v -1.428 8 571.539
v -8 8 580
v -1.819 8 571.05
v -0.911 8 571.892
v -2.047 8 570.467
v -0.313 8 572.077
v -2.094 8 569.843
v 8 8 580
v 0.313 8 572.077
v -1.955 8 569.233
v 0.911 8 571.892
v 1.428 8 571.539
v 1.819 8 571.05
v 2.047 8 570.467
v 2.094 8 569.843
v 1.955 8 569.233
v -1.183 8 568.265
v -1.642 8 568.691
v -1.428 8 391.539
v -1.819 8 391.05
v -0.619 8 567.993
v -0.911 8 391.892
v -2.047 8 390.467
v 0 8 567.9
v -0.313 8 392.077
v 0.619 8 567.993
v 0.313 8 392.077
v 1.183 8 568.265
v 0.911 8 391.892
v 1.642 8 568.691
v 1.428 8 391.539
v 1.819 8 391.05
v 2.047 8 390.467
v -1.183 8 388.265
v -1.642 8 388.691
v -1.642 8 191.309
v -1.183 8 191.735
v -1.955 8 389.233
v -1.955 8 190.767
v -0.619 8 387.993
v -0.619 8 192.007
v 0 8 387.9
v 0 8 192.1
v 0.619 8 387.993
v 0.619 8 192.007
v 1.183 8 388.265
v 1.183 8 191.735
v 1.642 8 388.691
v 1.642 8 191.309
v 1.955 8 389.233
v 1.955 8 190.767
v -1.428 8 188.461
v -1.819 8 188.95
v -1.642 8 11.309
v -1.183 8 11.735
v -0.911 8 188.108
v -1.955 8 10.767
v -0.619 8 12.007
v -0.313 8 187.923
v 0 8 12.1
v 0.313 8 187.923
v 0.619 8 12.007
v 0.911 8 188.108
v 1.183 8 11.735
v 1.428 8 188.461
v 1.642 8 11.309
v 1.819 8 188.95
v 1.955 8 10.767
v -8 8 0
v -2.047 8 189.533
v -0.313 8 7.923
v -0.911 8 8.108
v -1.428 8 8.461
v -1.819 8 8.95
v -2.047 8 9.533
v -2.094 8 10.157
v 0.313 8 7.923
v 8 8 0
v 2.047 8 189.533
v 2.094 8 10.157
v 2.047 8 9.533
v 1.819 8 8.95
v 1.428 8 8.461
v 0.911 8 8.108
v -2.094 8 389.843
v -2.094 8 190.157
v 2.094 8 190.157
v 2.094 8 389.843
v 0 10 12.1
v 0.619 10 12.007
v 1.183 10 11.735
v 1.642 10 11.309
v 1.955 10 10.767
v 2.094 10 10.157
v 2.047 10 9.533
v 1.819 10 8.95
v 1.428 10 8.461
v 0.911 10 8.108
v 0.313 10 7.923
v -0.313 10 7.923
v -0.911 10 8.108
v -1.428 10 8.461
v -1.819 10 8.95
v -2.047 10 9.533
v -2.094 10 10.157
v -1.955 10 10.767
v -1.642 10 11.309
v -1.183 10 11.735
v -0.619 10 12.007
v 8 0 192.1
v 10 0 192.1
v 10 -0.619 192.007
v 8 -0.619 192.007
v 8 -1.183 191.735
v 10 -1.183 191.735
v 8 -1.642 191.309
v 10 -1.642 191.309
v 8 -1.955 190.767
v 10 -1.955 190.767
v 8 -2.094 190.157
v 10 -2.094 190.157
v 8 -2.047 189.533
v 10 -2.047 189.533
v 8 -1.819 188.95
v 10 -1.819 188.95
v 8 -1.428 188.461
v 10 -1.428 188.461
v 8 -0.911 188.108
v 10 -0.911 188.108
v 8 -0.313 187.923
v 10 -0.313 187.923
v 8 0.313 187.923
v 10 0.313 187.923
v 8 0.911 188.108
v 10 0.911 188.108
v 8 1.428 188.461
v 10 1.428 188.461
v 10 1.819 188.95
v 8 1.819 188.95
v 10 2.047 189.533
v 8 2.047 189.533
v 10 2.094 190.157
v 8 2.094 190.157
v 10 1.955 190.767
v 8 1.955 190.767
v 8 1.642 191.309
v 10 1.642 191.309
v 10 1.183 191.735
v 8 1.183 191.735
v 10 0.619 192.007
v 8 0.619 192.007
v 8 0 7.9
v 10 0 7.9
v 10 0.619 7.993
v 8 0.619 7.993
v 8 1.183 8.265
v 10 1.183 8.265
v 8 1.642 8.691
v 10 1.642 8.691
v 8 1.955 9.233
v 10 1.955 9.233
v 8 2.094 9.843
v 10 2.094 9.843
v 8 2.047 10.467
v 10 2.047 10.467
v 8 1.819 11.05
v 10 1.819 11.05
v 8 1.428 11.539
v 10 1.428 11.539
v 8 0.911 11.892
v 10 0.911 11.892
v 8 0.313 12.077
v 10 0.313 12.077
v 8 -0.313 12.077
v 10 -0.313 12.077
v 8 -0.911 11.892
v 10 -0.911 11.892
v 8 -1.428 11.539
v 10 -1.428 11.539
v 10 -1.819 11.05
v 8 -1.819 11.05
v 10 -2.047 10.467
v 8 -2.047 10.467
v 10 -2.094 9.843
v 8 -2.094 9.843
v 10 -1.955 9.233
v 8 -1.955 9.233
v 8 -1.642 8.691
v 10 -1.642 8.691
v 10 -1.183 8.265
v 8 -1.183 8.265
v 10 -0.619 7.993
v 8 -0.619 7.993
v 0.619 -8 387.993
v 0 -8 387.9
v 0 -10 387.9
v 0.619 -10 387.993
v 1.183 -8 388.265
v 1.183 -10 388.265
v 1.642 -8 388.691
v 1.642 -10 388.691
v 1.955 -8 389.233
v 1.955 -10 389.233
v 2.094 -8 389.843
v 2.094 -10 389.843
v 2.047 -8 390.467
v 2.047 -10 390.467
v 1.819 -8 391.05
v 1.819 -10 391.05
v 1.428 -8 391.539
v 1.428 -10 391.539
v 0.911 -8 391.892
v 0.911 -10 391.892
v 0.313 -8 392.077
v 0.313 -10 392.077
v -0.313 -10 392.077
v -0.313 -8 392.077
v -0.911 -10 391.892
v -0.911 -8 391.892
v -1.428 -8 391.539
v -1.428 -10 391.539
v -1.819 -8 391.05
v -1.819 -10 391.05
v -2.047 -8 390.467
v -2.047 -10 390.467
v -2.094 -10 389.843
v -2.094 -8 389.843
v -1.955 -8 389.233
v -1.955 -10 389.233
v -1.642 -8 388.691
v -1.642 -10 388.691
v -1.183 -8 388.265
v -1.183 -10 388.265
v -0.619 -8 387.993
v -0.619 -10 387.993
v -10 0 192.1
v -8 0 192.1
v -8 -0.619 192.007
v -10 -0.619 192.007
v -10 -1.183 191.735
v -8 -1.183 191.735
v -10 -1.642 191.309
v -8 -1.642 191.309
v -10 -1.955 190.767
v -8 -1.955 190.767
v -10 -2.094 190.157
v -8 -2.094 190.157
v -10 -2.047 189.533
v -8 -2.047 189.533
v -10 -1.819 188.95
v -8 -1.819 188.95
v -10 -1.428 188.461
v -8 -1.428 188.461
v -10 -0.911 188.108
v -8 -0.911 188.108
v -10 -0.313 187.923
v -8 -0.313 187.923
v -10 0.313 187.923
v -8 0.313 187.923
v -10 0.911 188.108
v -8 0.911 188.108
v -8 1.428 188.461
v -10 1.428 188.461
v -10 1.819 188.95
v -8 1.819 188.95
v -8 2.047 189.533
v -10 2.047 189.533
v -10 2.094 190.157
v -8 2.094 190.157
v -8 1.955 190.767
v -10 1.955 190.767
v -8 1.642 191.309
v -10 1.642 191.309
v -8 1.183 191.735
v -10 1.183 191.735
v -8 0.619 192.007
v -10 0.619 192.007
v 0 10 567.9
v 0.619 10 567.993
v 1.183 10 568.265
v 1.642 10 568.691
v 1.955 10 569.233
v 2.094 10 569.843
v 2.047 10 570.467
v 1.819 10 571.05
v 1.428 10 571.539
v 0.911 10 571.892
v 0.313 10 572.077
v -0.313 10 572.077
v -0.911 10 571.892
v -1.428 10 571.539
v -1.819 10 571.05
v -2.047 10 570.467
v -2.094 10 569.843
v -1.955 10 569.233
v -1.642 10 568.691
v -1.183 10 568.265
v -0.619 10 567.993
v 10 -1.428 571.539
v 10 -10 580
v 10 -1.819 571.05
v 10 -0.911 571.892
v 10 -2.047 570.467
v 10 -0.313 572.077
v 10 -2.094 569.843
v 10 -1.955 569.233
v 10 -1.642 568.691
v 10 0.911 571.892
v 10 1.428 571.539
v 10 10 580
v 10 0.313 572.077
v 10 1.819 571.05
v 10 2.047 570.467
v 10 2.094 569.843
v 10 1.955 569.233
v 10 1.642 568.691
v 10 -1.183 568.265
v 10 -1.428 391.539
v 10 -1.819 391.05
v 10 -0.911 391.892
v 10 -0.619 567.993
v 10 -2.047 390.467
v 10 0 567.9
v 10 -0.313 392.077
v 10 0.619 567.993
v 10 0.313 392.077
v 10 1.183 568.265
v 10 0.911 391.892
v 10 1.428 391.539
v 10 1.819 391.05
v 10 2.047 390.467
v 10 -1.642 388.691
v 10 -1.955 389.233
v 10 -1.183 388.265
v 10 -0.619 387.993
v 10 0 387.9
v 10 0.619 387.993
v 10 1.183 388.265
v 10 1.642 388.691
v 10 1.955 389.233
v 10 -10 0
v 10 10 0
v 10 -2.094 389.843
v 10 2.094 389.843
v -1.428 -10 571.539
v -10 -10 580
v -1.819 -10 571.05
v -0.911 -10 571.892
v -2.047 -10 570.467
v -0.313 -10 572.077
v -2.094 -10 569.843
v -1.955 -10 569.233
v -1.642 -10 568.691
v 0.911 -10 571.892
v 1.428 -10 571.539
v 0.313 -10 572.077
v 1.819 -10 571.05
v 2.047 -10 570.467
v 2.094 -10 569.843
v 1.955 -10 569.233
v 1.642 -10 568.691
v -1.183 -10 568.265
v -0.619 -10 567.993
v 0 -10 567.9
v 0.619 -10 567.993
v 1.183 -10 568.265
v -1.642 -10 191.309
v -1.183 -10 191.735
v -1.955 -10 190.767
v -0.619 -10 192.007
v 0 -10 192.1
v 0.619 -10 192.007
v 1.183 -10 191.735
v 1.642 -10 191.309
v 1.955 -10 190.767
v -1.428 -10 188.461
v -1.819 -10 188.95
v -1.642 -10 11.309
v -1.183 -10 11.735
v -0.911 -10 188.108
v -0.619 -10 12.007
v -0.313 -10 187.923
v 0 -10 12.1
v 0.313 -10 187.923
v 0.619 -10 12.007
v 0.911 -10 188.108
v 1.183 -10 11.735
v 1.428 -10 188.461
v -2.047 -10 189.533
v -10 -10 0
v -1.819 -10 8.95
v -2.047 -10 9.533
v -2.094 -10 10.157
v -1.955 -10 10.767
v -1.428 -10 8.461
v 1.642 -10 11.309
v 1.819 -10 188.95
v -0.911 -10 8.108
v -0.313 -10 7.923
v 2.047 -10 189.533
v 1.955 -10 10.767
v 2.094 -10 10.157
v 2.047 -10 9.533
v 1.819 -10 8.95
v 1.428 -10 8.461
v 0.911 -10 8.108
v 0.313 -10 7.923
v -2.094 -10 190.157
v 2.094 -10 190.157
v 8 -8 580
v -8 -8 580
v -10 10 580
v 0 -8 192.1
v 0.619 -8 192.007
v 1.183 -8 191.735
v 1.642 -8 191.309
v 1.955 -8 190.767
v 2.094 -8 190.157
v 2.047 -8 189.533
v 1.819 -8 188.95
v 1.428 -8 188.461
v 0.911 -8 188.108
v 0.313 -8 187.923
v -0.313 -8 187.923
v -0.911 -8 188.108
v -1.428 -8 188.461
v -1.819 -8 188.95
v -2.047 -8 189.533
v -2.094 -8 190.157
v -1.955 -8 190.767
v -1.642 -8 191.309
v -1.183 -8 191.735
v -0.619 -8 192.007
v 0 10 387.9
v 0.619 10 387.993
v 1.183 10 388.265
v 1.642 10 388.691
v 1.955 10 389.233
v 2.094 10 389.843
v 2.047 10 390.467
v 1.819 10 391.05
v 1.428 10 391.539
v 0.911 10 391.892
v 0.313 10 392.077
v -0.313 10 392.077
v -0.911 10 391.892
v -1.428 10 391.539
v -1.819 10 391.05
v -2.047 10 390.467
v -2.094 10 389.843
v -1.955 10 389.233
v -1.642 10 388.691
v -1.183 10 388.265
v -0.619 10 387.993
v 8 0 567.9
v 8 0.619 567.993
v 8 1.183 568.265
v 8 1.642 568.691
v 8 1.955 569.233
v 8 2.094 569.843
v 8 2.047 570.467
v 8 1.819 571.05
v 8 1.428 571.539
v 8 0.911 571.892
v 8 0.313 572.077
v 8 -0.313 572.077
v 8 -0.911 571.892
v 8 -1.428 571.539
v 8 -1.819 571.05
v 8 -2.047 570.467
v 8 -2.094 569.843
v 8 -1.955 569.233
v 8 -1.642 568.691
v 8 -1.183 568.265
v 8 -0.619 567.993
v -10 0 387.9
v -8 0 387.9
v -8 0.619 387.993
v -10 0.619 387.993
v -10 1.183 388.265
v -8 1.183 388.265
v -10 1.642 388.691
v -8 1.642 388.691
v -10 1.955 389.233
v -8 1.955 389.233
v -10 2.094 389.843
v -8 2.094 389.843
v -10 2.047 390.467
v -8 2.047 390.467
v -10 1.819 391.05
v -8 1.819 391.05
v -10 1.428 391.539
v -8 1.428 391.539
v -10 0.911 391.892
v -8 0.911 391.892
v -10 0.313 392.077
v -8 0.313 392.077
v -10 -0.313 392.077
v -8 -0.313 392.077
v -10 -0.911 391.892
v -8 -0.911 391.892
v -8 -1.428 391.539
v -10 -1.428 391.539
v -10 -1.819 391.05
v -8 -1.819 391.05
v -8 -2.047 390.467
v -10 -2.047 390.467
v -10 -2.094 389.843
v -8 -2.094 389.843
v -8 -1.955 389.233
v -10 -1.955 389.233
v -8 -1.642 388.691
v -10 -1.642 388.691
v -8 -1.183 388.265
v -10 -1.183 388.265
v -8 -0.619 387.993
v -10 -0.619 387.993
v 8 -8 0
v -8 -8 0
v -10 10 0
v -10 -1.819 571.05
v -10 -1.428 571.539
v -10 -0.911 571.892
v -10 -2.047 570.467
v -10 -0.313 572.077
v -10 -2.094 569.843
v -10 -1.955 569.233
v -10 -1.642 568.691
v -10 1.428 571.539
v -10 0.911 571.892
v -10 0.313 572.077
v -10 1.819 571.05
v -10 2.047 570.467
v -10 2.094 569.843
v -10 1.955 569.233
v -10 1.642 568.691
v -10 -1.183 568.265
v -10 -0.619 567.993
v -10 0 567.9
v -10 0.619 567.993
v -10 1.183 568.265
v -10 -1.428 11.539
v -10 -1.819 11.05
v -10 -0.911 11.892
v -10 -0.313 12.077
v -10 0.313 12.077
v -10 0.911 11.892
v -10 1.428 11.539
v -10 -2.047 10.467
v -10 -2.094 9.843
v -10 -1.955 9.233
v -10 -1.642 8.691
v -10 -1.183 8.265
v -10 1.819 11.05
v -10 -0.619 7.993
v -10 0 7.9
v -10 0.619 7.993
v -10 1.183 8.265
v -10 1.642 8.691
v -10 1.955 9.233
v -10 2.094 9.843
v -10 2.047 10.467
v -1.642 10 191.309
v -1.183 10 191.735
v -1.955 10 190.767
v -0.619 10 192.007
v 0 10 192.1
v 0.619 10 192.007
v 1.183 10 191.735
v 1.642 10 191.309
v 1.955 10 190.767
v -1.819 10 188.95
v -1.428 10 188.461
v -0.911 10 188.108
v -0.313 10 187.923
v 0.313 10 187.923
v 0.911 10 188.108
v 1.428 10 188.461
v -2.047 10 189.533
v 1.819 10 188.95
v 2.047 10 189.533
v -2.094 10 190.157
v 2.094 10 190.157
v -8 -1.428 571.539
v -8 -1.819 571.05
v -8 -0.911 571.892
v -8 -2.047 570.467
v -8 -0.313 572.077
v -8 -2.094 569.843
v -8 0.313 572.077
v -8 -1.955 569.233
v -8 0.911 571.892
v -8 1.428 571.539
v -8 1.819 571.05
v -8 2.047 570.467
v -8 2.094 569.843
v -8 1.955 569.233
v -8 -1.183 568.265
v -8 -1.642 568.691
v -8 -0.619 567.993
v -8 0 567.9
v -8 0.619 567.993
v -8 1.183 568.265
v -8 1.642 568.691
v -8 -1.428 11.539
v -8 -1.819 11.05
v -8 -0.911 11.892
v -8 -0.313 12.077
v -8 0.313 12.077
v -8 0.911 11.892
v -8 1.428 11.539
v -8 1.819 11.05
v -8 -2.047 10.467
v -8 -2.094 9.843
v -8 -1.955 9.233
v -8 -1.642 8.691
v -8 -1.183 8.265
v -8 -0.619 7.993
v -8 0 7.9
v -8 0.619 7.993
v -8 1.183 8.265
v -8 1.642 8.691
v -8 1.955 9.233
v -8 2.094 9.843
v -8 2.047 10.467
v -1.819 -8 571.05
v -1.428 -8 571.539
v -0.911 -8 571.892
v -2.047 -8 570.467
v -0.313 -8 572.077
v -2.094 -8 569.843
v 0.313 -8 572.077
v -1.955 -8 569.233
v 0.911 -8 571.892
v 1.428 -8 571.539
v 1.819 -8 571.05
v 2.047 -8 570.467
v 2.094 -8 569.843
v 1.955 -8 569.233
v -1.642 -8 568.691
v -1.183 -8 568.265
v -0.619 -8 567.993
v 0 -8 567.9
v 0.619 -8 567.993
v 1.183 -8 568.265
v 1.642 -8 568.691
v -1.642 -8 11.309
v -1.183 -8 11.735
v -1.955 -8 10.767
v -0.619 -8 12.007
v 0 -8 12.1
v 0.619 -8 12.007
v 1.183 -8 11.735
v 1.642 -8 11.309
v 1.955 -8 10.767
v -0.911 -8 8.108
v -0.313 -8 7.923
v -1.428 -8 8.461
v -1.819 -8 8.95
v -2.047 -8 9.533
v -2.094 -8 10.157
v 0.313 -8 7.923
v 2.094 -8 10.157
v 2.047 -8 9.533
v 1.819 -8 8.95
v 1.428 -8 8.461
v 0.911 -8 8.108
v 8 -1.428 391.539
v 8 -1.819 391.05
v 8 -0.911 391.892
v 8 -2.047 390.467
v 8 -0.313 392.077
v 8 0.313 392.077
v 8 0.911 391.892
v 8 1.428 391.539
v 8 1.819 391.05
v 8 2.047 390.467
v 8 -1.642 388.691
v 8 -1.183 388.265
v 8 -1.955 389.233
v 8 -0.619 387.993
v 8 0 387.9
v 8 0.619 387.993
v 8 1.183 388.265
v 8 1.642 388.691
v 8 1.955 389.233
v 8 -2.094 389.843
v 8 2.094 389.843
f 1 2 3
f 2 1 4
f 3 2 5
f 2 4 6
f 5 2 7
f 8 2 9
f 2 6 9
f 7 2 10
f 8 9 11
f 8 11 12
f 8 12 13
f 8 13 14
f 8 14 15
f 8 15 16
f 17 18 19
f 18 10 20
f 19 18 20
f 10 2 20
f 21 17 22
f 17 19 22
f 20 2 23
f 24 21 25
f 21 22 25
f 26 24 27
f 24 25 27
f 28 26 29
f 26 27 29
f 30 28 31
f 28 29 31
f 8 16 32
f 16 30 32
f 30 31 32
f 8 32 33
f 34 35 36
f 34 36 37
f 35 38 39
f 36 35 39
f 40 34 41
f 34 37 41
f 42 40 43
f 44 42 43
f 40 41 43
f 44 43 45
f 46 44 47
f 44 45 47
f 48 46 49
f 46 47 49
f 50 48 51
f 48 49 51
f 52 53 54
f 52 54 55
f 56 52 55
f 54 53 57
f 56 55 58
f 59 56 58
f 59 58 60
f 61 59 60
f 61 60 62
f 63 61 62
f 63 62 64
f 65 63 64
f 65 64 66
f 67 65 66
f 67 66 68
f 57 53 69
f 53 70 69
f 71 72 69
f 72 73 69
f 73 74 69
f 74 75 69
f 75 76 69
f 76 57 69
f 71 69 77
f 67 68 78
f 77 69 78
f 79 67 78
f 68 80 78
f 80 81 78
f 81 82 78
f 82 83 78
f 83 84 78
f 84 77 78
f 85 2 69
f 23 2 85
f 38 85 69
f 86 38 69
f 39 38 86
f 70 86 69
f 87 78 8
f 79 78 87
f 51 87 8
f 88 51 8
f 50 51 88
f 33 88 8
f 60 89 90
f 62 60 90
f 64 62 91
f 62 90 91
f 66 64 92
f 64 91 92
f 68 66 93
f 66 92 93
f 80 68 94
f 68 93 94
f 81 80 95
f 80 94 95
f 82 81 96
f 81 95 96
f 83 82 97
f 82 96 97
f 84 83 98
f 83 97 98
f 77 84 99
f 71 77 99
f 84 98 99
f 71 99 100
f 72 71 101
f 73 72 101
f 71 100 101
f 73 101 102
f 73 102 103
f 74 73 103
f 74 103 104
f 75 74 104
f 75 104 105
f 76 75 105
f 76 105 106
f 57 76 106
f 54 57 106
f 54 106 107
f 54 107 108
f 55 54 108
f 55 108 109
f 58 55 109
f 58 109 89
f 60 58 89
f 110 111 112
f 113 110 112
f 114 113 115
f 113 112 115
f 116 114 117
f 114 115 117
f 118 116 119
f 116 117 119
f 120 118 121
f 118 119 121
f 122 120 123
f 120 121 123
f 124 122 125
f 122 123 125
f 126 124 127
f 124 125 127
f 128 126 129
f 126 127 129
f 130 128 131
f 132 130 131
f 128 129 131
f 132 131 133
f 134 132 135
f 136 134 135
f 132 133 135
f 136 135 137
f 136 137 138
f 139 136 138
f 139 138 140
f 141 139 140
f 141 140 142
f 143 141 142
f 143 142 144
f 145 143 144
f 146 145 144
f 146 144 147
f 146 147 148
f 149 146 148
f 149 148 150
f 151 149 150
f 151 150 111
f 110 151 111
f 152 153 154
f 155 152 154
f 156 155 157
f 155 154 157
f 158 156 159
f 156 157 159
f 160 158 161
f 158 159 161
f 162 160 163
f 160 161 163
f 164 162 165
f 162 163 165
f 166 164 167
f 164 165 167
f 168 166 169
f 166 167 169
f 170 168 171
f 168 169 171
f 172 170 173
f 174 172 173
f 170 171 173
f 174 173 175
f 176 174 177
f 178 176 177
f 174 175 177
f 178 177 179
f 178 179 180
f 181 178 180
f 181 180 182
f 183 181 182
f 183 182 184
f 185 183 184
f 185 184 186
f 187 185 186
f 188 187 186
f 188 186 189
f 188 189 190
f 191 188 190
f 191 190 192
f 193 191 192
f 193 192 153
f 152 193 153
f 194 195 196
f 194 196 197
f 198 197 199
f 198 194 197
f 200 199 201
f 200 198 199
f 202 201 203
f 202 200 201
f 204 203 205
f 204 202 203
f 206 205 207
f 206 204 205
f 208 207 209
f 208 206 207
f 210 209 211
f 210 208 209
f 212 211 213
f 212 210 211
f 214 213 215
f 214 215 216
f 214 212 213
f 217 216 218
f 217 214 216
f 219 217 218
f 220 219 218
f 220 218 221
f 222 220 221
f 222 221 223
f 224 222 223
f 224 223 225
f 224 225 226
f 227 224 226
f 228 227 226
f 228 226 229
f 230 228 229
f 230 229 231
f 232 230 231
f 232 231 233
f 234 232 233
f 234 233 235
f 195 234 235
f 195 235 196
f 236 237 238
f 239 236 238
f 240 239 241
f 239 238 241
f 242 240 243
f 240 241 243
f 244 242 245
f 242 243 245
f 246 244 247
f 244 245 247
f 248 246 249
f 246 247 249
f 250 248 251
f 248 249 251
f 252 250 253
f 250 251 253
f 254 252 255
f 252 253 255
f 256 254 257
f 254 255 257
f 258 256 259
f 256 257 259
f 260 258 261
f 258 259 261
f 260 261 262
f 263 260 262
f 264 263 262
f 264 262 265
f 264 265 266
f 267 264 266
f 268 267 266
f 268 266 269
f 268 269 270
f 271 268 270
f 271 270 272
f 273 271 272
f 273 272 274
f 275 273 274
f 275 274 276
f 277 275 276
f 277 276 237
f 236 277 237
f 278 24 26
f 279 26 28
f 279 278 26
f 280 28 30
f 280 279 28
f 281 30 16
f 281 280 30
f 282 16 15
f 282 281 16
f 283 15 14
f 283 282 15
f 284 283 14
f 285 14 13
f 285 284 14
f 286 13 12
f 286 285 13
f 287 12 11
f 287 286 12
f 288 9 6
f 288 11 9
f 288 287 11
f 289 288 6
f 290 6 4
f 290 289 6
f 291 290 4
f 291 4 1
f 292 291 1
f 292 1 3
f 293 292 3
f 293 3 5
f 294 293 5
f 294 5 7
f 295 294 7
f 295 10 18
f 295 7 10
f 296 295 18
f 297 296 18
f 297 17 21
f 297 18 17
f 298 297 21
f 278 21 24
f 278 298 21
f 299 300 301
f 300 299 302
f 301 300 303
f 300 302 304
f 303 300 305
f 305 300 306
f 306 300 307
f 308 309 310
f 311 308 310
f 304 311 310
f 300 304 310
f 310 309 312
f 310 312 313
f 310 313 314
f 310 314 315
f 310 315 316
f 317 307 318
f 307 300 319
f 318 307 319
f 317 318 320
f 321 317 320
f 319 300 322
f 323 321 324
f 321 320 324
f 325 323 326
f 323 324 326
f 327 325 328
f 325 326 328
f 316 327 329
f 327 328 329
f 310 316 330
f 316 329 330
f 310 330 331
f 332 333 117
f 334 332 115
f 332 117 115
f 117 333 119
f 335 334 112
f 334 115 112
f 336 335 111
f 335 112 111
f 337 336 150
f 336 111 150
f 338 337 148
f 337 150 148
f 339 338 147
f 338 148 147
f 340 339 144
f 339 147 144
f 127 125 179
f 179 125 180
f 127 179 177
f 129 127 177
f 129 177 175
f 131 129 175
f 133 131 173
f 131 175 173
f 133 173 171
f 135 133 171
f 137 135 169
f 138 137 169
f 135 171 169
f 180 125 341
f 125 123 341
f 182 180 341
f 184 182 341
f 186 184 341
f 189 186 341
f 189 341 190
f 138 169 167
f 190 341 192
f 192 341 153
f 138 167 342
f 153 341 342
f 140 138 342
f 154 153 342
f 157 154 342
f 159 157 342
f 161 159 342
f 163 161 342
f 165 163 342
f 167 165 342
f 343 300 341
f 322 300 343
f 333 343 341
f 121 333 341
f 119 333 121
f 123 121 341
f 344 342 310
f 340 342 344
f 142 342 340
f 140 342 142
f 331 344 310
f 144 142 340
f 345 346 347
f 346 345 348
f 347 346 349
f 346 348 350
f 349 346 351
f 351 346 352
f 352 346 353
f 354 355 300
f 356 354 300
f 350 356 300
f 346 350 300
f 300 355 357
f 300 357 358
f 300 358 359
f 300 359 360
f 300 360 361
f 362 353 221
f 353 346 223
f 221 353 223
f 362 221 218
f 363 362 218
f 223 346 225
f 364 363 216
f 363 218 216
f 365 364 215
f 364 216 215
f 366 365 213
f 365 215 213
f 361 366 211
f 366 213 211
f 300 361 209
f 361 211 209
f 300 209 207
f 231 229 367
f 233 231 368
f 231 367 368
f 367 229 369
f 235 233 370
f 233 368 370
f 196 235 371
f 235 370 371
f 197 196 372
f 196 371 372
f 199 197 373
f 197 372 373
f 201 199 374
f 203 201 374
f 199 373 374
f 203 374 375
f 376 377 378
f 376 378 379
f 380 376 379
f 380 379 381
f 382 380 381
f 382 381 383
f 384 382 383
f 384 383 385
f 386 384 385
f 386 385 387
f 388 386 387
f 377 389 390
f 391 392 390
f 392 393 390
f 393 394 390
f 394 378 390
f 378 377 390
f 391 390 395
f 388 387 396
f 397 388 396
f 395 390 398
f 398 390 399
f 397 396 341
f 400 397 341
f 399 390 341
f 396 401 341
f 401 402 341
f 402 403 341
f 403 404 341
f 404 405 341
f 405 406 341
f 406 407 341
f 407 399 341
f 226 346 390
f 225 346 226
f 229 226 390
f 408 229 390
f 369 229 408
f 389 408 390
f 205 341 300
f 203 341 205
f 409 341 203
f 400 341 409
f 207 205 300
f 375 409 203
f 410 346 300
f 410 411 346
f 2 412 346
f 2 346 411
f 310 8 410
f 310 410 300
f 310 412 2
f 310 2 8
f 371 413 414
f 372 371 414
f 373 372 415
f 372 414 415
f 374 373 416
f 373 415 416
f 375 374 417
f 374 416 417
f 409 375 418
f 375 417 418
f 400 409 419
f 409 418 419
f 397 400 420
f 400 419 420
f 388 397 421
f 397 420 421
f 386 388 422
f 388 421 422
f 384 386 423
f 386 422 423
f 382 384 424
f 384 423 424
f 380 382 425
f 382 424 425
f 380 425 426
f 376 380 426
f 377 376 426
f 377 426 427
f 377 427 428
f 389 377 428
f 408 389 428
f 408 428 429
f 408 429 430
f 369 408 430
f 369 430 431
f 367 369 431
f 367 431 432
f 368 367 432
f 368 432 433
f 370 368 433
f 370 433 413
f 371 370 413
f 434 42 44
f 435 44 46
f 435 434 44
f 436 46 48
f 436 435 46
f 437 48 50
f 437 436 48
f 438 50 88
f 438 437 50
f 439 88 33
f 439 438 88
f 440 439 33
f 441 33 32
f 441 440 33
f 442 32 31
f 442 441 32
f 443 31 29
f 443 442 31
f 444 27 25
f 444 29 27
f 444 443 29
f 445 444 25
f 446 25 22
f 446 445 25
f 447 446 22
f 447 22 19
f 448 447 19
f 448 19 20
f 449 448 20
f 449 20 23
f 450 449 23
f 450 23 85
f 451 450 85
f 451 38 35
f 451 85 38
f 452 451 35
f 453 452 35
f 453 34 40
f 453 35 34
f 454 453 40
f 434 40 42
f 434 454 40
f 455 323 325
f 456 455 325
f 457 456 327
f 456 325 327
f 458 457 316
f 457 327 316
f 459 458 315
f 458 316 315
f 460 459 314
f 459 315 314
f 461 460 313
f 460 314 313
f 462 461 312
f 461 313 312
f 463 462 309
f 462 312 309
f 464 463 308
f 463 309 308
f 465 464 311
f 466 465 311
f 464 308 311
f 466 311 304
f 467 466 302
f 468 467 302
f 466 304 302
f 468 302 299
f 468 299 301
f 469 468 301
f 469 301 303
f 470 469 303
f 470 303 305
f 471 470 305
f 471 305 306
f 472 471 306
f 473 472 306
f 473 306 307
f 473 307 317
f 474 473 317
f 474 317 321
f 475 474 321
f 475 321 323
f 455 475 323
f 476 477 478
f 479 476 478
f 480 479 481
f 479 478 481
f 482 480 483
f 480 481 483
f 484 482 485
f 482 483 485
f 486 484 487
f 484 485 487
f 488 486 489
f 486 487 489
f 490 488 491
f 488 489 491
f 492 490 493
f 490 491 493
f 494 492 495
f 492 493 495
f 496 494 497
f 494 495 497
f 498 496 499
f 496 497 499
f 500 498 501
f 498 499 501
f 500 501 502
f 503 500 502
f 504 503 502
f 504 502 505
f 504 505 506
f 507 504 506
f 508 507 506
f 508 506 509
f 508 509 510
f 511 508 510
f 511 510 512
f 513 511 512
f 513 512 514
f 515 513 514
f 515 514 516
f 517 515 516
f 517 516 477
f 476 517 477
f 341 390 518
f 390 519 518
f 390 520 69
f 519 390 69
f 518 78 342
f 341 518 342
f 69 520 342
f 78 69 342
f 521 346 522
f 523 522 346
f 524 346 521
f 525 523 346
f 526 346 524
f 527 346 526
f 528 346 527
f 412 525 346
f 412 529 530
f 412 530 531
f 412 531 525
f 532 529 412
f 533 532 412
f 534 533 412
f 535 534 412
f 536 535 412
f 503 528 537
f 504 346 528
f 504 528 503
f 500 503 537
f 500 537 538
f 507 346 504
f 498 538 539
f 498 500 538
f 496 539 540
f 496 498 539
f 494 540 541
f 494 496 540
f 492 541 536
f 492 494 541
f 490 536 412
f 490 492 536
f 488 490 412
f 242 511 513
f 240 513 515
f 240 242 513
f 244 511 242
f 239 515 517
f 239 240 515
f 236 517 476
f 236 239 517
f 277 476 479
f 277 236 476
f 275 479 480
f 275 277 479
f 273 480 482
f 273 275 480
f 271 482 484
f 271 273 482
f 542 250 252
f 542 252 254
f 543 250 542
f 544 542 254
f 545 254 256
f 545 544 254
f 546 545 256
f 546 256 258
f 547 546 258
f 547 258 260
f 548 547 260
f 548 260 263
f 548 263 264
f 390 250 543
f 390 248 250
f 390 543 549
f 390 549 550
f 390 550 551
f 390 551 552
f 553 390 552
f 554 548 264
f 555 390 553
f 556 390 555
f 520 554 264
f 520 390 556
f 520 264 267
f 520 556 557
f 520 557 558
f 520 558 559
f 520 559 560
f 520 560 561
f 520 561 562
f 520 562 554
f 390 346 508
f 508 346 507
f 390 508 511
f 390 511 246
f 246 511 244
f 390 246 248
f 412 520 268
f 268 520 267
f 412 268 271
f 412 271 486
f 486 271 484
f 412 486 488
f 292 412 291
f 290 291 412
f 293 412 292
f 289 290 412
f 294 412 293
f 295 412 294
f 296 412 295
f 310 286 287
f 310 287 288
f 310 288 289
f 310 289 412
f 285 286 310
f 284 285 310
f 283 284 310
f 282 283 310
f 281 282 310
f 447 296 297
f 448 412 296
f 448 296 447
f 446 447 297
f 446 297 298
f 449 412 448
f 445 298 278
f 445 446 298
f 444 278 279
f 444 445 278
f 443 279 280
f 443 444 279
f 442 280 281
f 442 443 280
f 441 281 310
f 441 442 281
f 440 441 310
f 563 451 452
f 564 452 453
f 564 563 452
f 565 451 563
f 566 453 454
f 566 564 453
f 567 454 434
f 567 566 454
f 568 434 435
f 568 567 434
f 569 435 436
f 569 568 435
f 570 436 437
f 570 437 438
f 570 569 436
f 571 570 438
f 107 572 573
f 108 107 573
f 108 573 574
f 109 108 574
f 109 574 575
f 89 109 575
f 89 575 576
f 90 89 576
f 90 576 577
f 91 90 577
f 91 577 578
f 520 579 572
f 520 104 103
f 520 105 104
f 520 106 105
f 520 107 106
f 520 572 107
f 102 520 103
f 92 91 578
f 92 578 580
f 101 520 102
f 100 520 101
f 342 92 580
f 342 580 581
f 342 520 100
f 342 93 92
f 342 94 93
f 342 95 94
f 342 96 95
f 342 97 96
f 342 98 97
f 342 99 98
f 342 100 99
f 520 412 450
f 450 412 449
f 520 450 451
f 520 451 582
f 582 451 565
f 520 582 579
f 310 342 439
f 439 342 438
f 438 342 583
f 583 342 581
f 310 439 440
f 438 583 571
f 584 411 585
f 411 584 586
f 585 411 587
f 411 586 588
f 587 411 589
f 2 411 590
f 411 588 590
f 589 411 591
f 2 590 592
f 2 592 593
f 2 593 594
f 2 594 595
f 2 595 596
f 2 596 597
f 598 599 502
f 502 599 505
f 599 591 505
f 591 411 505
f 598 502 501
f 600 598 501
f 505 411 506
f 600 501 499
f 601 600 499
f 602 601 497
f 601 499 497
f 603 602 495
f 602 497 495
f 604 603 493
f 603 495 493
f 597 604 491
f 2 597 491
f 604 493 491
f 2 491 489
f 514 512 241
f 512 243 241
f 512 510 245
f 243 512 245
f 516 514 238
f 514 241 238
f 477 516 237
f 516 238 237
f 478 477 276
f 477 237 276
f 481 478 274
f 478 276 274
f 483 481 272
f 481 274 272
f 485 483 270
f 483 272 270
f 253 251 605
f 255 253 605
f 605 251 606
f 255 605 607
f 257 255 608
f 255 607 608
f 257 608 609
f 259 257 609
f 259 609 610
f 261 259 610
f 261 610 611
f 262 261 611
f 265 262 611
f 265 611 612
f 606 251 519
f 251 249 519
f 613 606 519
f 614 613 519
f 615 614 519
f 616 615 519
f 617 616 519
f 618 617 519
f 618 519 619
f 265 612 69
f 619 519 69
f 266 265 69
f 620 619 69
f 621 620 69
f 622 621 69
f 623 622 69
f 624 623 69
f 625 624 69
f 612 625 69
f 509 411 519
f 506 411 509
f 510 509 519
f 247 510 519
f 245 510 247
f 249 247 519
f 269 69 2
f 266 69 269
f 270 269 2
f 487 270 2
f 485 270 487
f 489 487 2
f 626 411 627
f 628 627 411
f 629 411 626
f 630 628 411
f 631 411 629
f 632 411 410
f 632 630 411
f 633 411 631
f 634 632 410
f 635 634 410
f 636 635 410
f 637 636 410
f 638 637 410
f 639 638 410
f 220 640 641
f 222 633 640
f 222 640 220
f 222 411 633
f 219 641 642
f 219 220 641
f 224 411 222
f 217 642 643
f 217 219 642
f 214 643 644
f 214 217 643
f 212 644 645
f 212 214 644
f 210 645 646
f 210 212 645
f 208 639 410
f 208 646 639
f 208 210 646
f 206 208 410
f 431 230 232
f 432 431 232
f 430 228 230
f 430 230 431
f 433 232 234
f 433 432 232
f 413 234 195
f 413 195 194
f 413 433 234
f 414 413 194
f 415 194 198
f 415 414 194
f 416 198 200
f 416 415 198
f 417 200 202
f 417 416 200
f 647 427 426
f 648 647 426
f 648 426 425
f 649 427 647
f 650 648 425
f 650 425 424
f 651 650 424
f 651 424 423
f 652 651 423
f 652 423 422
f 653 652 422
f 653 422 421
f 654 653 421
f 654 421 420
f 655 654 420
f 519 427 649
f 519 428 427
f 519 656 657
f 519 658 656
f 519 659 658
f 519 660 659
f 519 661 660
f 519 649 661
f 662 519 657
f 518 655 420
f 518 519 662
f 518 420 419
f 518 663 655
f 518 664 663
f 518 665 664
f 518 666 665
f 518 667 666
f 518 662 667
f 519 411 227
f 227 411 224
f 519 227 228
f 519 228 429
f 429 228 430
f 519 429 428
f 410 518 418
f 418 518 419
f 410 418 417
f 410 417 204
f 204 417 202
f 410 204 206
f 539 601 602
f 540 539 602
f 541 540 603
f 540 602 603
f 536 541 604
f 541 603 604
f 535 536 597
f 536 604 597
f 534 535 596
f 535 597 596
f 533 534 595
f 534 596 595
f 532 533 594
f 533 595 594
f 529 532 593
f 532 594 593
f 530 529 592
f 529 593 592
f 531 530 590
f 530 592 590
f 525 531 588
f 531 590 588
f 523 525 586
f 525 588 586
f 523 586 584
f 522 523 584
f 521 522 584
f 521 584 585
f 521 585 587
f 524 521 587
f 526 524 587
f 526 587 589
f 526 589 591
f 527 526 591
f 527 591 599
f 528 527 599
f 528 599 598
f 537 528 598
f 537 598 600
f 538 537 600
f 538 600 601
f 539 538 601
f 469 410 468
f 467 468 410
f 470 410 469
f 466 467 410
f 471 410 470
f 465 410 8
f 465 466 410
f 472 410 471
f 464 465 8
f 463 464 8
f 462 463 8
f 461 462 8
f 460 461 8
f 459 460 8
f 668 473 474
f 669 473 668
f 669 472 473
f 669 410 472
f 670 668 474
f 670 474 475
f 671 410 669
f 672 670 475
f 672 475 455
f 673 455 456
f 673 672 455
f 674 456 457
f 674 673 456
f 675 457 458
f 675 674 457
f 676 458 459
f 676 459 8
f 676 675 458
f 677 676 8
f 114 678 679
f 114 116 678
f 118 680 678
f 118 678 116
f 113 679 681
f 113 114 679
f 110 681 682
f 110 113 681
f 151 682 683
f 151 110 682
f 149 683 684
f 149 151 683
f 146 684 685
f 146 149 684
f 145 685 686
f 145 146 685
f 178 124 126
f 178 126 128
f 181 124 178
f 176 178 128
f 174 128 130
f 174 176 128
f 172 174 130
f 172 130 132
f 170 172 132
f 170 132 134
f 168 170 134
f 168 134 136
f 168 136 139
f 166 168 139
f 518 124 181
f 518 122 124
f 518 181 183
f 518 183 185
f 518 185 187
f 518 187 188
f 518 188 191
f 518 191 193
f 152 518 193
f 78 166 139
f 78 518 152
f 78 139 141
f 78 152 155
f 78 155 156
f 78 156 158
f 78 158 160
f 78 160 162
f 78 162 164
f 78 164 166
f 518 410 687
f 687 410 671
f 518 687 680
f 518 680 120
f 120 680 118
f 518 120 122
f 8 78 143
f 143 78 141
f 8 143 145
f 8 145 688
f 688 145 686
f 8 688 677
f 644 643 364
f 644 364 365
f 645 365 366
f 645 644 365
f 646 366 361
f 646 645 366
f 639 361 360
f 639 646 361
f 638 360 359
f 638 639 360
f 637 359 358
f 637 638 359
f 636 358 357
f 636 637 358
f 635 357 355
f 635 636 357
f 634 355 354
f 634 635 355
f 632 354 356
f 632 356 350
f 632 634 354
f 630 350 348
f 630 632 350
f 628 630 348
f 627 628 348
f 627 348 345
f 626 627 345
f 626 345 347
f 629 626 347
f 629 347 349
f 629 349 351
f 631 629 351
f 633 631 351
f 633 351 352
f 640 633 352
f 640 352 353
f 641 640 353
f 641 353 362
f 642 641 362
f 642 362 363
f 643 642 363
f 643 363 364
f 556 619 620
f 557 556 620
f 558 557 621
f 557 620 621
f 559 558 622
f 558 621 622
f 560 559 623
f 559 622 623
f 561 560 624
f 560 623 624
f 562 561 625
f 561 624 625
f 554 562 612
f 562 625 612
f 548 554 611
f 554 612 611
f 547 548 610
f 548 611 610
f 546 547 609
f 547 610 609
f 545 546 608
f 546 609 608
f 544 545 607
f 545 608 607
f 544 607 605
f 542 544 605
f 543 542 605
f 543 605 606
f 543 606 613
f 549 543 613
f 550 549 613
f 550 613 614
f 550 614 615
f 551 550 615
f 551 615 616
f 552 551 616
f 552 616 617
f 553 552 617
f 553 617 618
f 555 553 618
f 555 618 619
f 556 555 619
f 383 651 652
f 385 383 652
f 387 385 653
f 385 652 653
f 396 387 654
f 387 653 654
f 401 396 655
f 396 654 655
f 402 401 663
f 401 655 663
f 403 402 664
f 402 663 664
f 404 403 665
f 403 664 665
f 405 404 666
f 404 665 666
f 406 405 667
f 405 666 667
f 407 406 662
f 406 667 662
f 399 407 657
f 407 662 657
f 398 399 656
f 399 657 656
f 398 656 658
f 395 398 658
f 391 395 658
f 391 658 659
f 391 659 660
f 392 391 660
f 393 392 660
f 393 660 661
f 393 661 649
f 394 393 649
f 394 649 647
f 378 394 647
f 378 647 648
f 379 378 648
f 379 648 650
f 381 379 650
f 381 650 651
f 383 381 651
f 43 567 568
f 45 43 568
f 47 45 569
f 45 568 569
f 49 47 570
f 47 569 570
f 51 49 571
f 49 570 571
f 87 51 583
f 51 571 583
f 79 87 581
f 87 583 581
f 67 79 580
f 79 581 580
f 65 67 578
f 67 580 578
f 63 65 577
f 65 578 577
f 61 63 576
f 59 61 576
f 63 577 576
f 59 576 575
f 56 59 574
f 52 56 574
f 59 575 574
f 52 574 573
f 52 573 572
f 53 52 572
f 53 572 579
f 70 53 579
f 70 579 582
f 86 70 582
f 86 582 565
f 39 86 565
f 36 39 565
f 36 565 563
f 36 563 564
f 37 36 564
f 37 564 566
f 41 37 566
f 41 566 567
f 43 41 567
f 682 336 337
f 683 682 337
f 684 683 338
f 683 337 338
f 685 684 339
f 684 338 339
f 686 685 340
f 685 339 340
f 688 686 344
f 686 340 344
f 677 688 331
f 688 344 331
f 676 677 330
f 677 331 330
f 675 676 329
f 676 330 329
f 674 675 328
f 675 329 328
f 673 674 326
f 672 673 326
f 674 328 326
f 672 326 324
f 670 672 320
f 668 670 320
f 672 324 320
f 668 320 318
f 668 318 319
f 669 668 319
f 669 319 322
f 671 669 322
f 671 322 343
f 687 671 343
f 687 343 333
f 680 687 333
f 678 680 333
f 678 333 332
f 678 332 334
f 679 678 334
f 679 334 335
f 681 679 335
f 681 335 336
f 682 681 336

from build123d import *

# Parameters (mm, degrees)
SKETCH_1_W          = 20
SKETCH_1_H          = 20
SKETCH_1_W_2        = 16
SKETCH_1_H_2        = 16
EXTRUDE_1_DEPTH     = 580
SKETCH_2_R          = 2.1
CUT_EXTRUDE_1_DEPTH = 20
SKETCH_3_R          = 2.1
CUT_EXTRUDE_2_DEPTH = 581.689245638


with BuildPart() as part:
    # 草图1 → 凸台-拉伸1 (new body)
    with BuildSketch(Plane.XY):
        Rectangle(SKETCH_1_W, SKETCH_1_H)
        Rectangle(SKETCH_1_W_2, SKETCH_1_H_2, mode=Mode.SUBTRACT)
    extrude(amount=EXTRUDE_1_DEPTH)

    # 草图2 → 切除-拉伸1 (cut)
    with BuildSketch(Plane(origin=(0, 10, 0), x_dir=(1, 0, 0), z_dir=(0, 1, 0))):
        with Locations(Location((0, -10, 0), (0, 0, 270))):
            Circle(SKETCH_2_R)
        with Locations(Location((0, -190, 0), (0, 0, 270))):
            Circle(SKETCH_2_R)
    cut_extrude_1 = extrude(amount=-CUT_EXTRUDE_1_DEPTH, mode=Mode.SUBTRACT)

    # 镜向1: 切除-拉伸1 across plane
    add(cut_extrude_1.mirror(Plane.XY.offset(290)), mode=Mode.SUBTRACT)

    # 草图3 → 切除-拉伸2 (cut, through all)
    with BuildSketch(Plane(origin=(10, 10, 580), x_dir=(0, 0, -1), z_dir=(1, 0, 0))):
        with Locations((10, -10)):
            Circle(SKETCH_3_R)
        with Locations((570, -10)):
            Circle(SKETCH_3_R)
        with Locations((190, -10)):
            Circle(SKETCH_3_R)
        with Locations(Location((390, -10, 0), (0, 0, 180))):
            Circle(SKETCH_3_R)
    extrude(amount=-CUT_EXTRUDE_2_DEPTH, mode=Mode.SUBTRACT)


solid = part.part
